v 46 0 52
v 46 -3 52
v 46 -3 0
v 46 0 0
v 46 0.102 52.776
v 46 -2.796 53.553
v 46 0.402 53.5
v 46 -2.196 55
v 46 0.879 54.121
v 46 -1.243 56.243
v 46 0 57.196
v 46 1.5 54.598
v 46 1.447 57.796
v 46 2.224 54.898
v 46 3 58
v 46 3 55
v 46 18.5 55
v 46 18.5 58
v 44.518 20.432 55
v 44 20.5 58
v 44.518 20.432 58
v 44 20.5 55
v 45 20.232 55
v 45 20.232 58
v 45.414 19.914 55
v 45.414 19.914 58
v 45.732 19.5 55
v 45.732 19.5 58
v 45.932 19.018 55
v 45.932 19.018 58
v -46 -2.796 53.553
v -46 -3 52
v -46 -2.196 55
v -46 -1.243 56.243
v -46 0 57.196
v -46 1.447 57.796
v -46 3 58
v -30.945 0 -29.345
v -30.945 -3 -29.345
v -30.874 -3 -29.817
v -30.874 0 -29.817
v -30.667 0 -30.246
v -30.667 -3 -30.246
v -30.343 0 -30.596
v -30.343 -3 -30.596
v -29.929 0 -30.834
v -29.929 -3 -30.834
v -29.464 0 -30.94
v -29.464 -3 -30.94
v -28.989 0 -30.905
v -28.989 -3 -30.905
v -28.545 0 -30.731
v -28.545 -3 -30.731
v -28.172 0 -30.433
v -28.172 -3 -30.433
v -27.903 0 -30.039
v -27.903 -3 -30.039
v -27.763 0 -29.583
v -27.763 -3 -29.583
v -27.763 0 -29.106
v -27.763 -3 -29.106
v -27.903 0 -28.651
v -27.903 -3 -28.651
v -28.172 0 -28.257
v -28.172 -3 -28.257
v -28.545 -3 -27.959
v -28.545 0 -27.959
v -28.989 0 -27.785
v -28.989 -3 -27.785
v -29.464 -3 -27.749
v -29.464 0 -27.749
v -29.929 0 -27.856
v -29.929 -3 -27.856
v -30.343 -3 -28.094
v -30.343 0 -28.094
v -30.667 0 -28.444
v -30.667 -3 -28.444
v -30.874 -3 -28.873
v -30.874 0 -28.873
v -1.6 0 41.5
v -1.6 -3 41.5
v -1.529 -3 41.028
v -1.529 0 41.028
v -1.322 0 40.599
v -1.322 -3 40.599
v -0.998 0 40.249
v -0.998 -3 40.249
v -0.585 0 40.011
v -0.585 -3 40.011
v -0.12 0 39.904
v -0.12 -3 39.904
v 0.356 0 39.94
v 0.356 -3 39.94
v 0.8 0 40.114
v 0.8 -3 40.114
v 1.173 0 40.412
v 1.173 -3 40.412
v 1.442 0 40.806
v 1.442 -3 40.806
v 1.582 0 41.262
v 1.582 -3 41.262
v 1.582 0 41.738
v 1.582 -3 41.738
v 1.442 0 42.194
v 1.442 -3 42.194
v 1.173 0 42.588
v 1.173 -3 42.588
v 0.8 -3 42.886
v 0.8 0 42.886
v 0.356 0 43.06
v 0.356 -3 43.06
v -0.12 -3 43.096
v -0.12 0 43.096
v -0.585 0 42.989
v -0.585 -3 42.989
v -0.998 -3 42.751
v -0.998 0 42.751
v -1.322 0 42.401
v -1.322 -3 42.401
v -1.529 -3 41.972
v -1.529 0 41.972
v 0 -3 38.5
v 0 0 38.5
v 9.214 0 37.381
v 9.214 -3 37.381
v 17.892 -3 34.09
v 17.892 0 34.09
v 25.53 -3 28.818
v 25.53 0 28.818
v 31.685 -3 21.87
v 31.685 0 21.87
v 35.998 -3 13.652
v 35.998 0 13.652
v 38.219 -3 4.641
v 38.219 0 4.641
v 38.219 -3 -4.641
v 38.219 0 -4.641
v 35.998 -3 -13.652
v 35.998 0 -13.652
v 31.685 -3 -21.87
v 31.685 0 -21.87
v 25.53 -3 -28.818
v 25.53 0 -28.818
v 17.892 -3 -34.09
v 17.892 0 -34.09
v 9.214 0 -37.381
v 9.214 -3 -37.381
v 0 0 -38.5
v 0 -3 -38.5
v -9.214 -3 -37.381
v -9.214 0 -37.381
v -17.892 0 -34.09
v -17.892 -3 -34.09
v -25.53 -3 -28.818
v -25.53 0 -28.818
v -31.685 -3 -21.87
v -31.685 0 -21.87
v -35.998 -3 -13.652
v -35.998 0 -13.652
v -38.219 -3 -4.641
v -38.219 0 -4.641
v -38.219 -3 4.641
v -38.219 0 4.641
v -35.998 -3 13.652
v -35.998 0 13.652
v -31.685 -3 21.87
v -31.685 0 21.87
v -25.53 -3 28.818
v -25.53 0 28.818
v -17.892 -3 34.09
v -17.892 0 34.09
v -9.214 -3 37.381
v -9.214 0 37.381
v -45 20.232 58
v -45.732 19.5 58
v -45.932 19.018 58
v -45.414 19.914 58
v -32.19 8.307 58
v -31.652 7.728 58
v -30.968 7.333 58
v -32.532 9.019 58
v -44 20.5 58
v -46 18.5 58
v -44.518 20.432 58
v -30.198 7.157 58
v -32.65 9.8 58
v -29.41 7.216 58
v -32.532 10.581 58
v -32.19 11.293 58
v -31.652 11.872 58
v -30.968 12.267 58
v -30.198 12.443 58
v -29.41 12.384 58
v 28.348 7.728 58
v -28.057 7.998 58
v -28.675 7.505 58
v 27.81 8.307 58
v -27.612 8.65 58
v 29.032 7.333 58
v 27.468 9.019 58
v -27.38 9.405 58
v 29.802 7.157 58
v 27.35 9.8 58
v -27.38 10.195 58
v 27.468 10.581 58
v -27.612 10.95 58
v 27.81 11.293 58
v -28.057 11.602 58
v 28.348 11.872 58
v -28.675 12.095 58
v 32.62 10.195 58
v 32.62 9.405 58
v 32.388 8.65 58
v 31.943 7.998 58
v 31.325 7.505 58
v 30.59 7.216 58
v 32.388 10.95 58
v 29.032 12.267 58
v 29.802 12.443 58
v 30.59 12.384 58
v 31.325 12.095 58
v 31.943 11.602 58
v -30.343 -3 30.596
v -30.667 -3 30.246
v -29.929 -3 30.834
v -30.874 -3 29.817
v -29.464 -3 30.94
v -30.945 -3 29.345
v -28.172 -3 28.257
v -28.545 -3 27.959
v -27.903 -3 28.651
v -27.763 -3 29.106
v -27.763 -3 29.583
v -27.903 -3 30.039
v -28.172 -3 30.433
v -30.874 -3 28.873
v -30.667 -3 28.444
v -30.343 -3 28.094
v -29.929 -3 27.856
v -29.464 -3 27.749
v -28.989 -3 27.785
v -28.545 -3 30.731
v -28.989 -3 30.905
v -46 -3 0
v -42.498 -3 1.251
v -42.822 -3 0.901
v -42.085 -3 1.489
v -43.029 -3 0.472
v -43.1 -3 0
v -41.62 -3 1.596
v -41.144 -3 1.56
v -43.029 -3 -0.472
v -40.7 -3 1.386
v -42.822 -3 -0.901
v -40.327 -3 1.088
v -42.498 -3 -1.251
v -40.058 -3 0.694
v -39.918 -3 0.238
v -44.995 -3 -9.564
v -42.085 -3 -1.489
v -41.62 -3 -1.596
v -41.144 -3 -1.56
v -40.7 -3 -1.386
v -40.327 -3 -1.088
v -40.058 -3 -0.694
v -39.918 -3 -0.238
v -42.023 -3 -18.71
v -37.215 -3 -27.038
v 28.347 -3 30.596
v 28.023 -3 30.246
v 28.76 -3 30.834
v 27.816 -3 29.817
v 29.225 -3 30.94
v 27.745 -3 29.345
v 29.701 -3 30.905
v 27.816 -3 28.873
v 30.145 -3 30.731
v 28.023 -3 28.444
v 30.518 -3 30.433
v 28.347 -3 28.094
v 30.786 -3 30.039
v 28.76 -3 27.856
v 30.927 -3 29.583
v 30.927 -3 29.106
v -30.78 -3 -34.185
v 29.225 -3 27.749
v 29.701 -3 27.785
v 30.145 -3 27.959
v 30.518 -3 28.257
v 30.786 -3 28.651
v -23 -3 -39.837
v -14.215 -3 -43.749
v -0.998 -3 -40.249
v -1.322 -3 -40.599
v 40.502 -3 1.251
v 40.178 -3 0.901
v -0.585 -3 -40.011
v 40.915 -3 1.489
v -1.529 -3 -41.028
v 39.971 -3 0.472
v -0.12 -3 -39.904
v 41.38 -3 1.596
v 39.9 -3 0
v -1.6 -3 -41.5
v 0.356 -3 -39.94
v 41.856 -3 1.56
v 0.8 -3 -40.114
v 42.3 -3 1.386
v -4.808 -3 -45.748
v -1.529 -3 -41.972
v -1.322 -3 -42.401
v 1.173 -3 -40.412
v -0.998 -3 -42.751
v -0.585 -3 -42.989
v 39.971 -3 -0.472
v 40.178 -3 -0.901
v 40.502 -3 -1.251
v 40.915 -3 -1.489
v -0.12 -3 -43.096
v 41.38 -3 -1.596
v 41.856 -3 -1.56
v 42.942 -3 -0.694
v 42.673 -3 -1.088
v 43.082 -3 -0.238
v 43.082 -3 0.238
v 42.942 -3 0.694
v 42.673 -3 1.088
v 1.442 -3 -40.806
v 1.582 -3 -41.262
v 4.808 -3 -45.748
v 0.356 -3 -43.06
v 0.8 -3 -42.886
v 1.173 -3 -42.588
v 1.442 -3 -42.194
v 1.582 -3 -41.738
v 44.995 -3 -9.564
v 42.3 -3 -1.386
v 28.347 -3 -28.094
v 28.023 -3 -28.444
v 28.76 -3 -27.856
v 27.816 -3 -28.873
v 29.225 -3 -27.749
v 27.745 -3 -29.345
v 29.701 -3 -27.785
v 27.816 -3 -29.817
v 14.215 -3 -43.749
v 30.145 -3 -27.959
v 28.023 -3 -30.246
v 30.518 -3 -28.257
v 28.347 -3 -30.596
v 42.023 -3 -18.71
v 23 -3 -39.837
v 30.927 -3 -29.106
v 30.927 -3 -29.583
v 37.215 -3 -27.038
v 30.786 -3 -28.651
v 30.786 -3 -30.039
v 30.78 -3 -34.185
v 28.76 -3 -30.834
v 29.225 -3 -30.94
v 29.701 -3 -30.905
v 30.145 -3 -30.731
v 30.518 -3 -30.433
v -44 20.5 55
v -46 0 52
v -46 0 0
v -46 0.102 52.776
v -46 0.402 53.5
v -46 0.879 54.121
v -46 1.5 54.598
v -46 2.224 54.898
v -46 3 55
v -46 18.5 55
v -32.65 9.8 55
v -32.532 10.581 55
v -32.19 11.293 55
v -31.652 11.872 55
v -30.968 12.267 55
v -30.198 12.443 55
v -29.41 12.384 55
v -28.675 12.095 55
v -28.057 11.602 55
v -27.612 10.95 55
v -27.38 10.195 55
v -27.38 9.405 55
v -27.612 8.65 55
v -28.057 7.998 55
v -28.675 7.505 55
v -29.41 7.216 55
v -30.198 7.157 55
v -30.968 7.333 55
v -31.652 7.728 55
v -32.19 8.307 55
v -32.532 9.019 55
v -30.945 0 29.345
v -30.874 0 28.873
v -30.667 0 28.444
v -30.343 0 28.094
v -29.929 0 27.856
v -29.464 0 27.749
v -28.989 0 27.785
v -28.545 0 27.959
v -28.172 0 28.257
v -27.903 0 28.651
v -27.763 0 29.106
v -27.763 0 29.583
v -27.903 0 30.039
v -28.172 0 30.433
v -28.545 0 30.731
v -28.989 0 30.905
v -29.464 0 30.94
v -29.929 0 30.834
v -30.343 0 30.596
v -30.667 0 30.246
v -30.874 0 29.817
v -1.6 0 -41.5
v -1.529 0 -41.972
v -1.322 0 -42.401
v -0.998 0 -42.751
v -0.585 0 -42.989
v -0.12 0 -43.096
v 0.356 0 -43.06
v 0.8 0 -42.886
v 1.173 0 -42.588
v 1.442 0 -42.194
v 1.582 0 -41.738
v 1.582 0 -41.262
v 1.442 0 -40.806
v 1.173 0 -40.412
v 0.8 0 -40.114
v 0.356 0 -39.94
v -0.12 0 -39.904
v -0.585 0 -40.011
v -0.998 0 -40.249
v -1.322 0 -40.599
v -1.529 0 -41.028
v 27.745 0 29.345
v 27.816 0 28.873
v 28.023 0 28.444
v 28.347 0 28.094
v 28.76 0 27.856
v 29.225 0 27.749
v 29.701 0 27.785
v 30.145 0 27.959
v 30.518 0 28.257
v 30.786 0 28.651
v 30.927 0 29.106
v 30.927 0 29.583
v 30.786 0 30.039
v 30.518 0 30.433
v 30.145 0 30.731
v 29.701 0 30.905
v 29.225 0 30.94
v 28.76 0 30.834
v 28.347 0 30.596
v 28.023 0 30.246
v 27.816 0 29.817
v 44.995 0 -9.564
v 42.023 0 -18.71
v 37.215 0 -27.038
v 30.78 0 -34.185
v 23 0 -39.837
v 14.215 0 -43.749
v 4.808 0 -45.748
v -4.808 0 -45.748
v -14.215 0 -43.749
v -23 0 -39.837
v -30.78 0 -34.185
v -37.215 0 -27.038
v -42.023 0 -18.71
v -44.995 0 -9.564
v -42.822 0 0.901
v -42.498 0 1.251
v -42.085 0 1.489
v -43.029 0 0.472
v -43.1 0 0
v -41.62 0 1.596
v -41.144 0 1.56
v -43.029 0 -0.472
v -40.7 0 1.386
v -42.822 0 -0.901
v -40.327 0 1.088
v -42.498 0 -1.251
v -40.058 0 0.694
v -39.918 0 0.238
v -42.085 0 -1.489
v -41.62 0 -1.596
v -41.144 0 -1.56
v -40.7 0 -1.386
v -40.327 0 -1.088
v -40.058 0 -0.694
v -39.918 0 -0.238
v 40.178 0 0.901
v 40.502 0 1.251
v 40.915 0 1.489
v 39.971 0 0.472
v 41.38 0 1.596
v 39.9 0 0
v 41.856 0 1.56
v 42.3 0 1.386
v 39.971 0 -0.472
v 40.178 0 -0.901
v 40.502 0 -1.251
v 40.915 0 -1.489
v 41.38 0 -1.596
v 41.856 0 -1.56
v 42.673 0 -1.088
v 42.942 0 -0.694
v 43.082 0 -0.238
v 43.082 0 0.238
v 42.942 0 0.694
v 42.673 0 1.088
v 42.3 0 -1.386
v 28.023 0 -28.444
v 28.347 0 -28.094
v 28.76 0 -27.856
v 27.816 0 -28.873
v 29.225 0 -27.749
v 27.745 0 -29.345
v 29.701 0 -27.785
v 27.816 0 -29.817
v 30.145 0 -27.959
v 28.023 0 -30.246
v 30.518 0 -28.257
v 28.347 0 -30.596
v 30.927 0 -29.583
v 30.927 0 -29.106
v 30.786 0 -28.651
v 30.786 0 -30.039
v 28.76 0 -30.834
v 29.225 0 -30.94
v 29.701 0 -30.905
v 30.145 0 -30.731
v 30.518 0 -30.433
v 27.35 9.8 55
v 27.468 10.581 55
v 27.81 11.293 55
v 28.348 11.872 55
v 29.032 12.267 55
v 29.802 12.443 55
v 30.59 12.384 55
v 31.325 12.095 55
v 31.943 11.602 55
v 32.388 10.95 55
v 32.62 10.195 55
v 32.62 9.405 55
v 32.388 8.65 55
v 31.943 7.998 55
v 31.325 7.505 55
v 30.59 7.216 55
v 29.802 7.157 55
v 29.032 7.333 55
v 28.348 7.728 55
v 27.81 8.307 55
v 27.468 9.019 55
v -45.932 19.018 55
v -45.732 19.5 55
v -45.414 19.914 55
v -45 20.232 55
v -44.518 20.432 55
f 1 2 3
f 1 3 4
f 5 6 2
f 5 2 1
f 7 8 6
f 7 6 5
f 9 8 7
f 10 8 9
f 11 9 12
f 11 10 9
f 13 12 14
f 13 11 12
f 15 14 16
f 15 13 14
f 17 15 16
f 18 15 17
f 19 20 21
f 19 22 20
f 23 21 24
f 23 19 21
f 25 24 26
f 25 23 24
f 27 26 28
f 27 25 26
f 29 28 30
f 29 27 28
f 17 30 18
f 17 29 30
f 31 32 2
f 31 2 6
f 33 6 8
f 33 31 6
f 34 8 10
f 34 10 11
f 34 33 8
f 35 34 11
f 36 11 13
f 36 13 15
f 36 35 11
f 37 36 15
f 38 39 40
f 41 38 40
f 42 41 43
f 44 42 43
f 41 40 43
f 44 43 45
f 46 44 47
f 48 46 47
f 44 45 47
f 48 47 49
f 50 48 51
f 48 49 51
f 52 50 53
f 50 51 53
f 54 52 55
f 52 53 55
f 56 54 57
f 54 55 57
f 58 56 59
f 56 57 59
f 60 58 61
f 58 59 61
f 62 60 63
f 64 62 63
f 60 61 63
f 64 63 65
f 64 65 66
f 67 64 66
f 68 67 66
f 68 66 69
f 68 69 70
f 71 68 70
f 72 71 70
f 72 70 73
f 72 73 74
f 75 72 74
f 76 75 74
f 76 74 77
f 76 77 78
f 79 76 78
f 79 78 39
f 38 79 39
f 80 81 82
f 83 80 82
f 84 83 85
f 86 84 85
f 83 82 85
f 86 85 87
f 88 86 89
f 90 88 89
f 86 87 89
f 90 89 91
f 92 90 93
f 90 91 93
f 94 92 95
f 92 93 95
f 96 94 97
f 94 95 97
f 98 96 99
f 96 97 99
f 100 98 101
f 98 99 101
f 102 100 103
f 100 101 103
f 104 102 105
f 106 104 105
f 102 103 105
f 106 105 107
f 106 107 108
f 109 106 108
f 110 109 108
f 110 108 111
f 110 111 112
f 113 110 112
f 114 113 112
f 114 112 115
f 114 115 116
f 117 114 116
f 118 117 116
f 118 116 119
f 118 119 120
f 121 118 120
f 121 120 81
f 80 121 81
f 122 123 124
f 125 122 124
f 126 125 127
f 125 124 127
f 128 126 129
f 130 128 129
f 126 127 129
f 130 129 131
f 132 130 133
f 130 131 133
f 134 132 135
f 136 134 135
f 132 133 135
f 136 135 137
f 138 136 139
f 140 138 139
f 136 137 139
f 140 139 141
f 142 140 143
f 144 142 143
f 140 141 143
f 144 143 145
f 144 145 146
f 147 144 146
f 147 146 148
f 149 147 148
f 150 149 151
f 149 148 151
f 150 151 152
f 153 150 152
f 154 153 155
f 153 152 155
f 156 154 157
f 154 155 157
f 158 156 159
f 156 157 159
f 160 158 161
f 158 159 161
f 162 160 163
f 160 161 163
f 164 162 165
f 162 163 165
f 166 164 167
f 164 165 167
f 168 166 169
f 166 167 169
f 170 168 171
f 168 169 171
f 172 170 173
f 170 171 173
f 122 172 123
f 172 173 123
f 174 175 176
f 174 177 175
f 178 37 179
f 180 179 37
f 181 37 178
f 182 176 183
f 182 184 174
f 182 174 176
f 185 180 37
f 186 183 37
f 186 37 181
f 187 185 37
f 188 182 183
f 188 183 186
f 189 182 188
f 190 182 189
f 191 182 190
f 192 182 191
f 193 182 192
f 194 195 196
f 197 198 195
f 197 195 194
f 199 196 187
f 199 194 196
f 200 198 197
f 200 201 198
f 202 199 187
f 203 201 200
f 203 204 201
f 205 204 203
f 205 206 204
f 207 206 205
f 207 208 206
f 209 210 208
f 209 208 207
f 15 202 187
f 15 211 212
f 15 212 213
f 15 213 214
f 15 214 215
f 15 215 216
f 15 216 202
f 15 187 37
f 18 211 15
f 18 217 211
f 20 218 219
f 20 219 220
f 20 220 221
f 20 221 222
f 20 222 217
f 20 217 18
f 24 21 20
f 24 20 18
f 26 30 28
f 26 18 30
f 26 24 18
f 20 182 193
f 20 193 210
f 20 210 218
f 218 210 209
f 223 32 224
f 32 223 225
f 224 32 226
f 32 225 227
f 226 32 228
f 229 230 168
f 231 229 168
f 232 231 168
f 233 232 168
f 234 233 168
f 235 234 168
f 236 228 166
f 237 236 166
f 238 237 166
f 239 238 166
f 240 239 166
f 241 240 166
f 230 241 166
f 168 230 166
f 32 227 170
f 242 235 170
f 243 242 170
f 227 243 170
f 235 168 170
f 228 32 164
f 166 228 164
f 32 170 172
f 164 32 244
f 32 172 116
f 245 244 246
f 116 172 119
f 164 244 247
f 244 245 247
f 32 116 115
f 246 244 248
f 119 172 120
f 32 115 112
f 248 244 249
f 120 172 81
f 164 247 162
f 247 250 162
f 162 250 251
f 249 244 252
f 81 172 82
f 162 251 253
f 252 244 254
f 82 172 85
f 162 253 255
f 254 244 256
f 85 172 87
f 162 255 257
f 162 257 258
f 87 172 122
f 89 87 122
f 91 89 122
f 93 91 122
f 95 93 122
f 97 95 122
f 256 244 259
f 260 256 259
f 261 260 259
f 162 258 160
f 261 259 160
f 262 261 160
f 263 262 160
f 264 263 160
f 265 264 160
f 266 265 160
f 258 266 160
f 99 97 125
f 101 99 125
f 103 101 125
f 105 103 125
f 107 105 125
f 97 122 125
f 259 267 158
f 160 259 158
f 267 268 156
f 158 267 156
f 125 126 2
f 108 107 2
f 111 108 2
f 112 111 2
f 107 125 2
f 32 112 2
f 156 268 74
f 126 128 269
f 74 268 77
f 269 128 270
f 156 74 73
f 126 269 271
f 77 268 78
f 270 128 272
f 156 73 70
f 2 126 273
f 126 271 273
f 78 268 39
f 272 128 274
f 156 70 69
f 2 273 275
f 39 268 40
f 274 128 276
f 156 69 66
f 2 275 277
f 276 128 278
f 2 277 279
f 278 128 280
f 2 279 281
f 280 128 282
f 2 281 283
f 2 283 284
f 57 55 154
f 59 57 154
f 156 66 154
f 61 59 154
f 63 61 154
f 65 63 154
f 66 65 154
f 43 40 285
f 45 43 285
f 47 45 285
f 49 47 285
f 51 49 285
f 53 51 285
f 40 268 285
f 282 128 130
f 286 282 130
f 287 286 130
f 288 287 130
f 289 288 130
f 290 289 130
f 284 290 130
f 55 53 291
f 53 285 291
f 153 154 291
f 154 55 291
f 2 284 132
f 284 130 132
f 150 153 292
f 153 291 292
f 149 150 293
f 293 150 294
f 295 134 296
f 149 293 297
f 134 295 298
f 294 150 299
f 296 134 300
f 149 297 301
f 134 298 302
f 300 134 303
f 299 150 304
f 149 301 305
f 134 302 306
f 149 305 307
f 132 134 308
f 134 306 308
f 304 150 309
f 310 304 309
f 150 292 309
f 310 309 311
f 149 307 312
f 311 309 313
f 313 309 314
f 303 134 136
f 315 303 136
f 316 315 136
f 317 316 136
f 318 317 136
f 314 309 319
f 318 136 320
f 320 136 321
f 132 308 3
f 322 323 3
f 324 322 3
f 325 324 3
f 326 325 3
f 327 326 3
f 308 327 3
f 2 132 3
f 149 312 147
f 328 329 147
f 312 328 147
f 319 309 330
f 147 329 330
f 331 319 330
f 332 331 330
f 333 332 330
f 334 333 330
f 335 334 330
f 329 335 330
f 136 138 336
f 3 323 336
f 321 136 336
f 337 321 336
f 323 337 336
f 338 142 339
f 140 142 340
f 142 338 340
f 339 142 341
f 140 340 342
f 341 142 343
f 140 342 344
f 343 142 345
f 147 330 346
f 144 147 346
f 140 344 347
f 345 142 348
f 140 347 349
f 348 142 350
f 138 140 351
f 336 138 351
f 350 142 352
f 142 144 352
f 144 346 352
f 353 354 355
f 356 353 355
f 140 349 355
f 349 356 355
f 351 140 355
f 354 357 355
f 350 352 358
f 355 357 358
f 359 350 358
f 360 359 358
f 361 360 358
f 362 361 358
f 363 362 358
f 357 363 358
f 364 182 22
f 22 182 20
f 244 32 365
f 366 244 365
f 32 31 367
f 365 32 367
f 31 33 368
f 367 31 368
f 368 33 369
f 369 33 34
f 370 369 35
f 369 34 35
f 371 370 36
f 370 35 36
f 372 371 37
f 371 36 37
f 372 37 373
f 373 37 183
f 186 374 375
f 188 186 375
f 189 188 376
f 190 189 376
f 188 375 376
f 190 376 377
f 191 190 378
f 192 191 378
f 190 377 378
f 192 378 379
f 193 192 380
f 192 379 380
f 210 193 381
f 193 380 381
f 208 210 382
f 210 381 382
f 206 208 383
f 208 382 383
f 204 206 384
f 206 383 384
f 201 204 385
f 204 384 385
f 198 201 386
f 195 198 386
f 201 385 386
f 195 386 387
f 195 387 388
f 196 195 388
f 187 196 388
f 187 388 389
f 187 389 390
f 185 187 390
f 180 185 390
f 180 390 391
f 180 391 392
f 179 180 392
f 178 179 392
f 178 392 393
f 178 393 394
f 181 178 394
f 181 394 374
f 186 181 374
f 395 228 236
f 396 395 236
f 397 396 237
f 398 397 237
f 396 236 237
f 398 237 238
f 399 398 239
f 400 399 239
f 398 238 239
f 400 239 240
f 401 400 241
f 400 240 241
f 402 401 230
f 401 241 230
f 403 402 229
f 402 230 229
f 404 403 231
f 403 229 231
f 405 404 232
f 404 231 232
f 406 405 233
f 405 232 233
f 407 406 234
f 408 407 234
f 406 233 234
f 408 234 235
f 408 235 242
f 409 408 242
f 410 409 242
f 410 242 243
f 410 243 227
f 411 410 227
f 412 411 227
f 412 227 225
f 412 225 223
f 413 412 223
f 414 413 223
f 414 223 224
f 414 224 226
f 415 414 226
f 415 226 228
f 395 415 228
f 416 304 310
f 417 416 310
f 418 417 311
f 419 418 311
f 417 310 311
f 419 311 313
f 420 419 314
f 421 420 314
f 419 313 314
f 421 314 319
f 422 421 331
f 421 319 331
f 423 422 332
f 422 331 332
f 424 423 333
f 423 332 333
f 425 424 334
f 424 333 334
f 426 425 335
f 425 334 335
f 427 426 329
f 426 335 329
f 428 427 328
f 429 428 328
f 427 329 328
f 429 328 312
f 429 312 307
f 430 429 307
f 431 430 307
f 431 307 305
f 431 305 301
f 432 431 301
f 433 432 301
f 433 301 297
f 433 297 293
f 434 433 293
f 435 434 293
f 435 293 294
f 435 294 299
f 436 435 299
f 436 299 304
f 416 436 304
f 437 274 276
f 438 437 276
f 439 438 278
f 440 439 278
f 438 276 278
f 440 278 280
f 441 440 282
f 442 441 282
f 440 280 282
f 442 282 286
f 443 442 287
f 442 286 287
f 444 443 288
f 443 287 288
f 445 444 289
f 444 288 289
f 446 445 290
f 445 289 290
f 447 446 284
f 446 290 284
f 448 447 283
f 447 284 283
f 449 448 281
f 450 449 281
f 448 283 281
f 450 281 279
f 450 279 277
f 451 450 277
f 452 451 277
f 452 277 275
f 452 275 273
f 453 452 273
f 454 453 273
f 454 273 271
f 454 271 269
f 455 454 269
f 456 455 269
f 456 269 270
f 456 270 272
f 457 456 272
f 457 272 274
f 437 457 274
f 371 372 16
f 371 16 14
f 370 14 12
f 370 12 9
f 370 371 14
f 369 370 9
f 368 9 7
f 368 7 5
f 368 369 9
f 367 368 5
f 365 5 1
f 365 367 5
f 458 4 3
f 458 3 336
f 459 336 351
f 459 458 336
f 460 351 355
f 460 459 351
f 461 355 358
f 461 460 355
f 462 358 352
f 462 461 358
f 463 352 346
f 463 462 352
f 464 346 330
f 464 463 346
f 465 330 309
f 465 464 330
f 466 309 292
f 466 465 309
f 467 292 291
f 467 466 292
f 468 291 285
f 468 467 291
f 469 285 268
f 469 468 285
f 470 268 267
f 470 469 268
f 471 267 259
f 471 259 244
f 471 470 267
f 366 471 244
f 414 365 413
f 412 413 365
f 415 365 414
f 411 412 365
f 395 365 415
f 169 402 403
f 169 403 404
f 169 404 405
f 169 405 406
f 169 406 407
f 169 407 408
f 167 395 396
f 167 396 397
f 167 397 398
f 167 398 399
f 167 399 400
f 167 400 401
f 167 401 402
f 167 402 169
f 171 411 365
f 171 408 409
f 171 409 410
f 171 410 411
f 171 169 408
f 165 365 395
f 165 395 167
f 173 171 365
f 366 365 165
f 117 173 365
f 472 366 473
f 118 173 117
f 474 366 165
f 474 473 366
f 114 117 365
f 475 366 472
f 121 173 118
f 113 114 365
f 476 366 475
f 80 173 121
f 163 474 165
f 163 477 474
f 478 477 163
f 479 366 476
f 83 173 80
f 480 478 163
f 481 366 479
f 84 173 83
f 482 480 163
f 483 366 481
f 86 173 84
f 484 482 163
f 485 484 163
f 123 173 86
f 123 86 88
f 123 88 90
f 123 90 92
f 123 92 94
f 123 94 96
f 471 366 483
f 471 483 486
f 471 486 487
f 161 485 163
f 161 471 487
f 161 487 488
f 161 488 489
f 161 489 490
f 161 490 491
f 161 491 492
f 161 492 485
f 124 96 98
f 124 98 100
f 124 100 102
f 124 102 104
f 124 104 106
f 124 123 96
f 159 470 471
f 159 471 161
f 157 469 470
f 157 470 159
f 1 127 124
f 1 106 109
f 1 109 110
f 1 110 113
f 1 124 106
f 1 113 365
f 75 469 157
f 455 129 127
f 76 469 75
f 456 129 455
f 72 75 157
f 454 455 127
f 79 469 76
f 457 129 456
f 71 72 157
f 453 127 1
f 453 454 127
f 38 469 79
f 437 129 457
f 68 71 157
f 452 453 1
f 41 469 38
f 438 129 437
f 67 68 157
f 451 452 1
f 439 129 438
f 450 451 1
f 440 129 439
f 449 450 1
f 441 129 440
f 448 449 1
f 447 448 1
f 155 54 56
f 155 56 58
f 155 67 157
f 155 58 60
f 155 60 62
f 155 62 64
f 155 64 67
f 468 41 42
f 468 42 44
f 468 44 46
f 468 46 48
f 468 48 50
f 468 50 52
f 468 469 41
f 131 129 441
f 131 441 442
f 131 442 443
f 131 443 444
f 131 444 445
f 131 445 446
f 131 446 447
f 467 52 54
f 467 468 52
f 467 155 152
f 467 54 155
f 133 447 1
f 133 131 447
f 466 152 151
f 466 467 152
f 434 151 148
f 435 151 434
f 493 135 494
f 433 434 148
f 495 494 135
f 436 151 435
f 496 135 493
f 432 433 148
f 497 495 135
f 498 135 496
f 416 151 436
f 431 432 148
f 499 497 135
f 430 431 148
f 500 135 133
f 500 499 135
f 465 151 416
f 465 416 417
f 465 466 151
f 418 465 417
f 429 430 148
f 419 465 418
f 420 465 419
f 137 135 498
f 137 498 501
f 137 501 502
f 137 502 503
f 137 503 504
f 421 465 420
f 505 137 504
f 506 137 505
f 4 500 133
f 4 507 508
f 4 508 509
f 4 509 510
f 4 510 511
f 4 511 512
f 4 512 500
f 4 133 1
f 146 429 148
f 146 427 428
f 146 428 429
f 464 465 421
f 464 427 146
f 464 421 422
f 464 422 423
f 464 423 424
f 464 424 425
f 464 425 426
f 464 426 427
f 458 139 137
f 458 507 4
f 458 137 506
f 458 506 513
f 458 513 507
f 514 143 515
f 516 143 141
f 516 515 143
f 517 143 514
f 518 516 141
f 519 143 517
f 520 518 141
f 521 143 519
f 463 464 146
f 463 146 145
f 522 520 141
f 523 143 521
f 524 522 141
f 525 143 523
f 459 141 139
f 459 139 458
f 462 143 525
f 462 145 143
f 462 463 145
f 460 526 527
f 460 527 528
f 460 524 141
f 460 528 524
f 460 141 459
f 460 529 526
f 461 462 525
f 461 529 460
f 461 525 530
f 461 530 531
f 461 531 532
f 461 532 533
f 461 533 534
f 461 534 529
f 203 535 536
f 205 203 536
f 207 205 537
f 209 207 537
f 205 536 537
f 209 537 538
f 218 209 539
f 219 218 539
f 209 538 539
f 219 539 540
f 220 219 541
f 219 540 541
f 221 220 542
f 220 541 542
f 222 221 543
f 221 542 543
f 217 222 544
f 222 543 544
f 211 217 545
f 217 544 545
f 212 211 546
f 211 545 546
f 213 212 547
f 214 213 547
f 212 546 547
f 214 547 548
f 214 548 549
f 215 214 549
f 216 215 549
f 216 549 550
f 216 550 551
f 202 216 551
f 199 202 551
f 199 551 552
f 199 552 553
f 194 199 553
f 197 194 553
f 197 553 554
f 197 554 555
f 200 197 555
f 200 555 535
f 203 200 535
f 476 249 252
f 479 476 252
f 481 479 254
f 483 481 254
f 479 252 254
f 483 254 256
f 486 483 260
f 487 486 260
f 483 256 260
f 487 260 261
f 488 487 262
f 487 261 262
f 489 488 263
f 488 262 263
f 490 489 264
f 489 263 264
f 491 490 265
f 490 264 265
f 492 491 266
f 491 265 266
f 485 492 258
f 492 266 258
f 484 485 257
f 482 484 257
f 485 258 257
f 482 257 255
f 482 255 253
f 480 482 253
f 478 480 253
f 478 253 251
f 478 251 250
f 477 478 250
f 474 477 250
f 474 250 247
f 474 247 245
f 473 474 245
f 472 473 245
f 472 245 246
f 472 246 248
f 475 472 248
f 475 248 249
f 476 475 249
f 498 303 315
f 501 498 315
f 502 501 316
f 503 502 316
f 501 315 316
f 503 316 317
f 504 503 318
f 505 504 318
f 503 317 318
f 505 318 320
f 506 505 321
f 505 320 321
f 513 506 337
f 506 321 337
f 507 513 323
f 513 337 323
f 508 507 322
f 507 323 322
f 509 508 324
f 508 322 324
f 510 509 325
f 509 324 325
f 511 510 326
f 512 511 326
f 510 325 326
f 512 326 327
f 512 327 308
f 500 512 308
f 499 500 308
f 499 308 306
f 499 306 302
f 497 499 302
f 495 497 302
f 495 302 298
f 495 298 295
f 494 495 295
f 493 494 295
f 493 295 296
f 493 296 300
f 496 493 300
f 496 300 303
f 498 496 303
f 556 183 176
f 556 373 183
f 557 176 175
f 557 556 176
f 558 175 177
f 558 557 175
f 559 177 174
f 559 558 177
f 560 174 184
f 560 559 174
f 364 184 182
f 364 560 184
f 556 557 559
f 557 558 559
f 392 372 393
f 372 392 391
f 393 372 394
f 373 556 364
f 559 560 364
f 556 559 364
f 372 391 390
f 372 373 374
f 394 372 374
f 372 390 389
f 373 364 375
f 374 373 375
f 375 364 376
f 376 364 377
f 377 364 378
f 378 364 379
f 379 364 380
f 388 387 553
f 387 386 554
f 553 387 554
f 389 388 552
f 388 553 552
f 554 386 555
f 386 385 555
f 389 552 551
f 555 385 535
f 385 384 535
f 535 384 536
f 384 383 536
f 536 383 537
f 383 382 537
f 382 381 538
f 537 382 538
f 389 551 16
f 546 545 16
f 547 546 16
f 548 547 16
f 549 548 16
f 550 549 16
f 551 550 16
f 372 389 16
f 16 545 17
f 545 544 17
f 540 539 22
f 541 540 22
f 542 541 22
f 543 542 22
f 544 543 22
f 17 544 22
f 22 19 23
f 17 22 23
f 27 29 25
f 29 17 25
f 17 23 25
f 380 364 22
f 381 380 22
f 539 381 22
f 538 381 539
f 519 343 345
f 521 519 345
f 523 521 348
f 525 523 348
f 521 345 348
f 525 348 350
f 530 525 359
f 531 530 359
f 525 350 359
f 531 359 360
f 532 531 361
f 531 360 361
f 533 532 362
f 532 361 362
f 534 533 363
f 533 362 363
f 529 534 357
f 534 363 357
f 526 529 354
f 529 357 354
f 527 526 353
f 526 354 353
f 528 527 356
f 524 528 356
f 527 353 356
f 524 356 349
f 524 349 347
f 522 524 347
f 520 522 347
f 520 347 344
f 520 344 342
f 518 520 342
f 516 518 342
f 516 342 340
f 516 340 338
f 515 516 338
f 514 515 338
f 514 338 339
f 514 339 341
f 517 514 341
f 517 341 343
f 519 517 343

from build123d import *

# Parameters (mm, degrees)
SKETCH1_R                    = 38.5
SKETCH1_R_2                  = 1
BASE_FLANGE1_DEPTH           = 3
EDGE_FLANGE1_STRIP_W         = 18
EDGE_FLANGE1_STRIP_H         = 3
EDGE_FLANGE1_STRIP_CUT_DEPTH = 92
EDGE_FLANGE1_DEPTH           = 92
EDGE_FLANGE1_START           = 3
EDGE_FLANGE1_PROFILE_W       = 92
EDGE_FLANGE1_PROFILE_H       = 17.5
EDGE_FLANGE1_PROFILE_R       = 1
EDGE_FLANGE1_FLAT_DEPTH      = 3
FILLET1_R                    = 2
M3_CLEARANCE_HOLE1_D         = 3.2
M3_CLEARANCE_HOLE1_DEPTH     = 136
M3_CLEARANCE_HOLE1_TIP       = 0.96137699
M5_CLEARANCE_HOLE1_D         = 5.3
M5_CLEARANCE_HOLE1_DEPTH     = 136
M5_CLEARANCE_HOLE1_TIP       = 1.59228064


# Sheet-metal steps are written as plain solids
with BuildPart() as part:
    # Sketch1 → Base-Flange1 (new body)
    with BuildSketch(Plane(origin=(0, 0, 0), x_dir=(1, 0, 0), z_dir=(0, 1, 0))):
        with BuildLine():
            Line((-46, 0), (-46, -55))
            Line((-46, -55), (46, -55))
            Line((46, -55), (46, 0))
            ThreePointArc((46, 0), (0, 46), (-46, 0))
        make_face()
        with Locations(Location((0, 0, 0), (0, 0, 270))):
            Circle(SKETCH1_R, mode=Mode.SUBTRACT)
        with Locations(Location((0, 41.5, 0), (0, 0, 270))):
            Circle(SKETCH1_R_2, mode=Mode.SUBTRACT)
        with Locations(Location((29.344931419, 29.344931419, 0), (0, 0, 270))):
            Circle(SKETCH1_R_2, mode=Mode.SUBTRACT)
        with Locations(Location((41.5, 0, 0), (0, 0, 270))):
            Circle(SKETCH1_R_2, mode=Mode.SUBTRACT)
        with Locations(Location((29.344931419, -29.344931419, 0), (0, 0, 270))):
            Circle(SKETCH1_R_2, mode=Mode.SUBTRACT)
        with Locations(Location((0, -41.5, 0), (0, 0, 270))):
            Circle(SKETCH1_R_2, mode=Mode.SUBTRACT)
        with Locations(Location((-29.344931419, -29.344931419, 0), (0, 0, 270))):
            Circle(SKETCH1_R_2, mode=Mode.SUBTRACT)
        with Locations(Location((-41.5, 0, 0), (0, 0, 270))):
            Circle(SKETCH1_R_2, mode=Mode.SUBTRACT)
        with Locations(Location((-29.344931419, 29.344931419, 0), (0, 0, 270))):
            Circle(SKETCH1_R_2, mode=Mode.SUBTRACT)
    extrude(amount=-BASE_FLANGE1_DEPTH)

    # Edge-Flange1 strip (across the edge) → Edge-Flange1 strip cut (cut)
    with BuildSketch(Plane(origin=(-46, 0, 55), x_dir=(0, 0, -1), z_dir=(1, 0, 0))):
        with Locations((-6, -1.5)):
            Rectangle(EDGE_FLANGE1_STRIP_W, EDGE_FLANGE1_STRIP_H)
    extrude(amount=EDGE_FLANGE1_STRIP_CUT_DEPTH, mode=Mode.SUBTRACT)

    # Edge-Flange1 bend section (across the edge) → Edge-Flange1 (add)
    with BuildSketch(Plane(origin=(-46, 0, 55), x_dir=(0, 0, -1), z_dir=(1, 0, 0))):
        with BuildLine():
            Line((-3, 3), (0, 3))
            ThreePointArc((0, 3), (0.878679656, 0.878679656), (3, 0))
            Line((3, 0), (3, -3))
            ThreePointArc((3, -3), (-1.242640687, -1.242640687), (-3, 3))
        make_face()
    extrude(amount=EDGE_FLANGE1_DEPTH)

    # Edge-Flange1 profile (on flange) → Edge-Flange1 flat (add)
    with BuildSketch(Plane.XY.offset(55).offset(EDGE_FLANGE1_START)):
        with Locations((0, 11.75)):
            Rectangle(EDGE_FLANGE1_PROFILE_W, EDGE_FLANGE1_PROFILE_H)
        with Locations((-30, 9.8)):
            Circle(EDGE_FLANGE1_PROFILE_R, mode=Mode.SUBTRACT)
        with Locations((30, 9.8)):
            Circle(EDGE_FLANGE1_PROFILE_R, mode=Mode.SUBTRACT)
    extrude(amount=-EDGE_FLANGE1_FLAT_DEPTH)

    # Fillet1
    fillet1_edges = [part.edges().sort_by_distance(p)[0] for p in [
        (-46, 20.5, 56.5),
        (46, 20.5, 56.5),
    ]]
    fillet(fillet1_edges, radius=FILLET1_R)

    # M3 Clearance Hole1
    with Locations(Plane(origin=(0, 0, 0), x_dir=(1, 0, 0), z_dir=(0, 1, 0))):
        with Locations((-29.344931419, 29.344931419), (0, 41.5), (-41.5, 0), (-29.344931419, -29.344931419), (0, -41.5), (29.344931419, -29.344931419), (41.5, 0), (29.344931419, 29.344931419)):
            Hole(M3_CLEARANCE_HOLE1_D / 2, depth=M3_CLEARANCE_HOLE1_DEPTH)
            with Locations((0, 0, -(M3_CLEARANCE_HOLE1_DEPTH + M3_CLEARANCE_HOLE1_TIP / 2))):  # 118° drill point
                Cone(0, M3_CLEARANCE_HOLE1_D / 2, M3_CLEARANCE_HOLE1_TIP, mode=Mode.SUBTRACT)

    # M5 Clearance Hole1
    with Locations(Plane.XY.offset(58)):
        with Locations((-30, 9.8), (30, 9.8)):
            Hole(M5_CLEARANCE_HOLE1_D / 2, depth=M5_CLEARANCE_HOLE1_DEPTH)
            with Locations((0, 0, -(M5_CLEARANCE_HOLE1_DEPTH + M5_CLEARANCE_HOLE1_TIP / 2))):  # 118° drill point
                Cone(0, M5_CLEARANCE_HOLE1_D / 2, M5_CLEARANCE_HOLE1_TIP, mode=Mode.SUBTRACT)


solid = part.part
